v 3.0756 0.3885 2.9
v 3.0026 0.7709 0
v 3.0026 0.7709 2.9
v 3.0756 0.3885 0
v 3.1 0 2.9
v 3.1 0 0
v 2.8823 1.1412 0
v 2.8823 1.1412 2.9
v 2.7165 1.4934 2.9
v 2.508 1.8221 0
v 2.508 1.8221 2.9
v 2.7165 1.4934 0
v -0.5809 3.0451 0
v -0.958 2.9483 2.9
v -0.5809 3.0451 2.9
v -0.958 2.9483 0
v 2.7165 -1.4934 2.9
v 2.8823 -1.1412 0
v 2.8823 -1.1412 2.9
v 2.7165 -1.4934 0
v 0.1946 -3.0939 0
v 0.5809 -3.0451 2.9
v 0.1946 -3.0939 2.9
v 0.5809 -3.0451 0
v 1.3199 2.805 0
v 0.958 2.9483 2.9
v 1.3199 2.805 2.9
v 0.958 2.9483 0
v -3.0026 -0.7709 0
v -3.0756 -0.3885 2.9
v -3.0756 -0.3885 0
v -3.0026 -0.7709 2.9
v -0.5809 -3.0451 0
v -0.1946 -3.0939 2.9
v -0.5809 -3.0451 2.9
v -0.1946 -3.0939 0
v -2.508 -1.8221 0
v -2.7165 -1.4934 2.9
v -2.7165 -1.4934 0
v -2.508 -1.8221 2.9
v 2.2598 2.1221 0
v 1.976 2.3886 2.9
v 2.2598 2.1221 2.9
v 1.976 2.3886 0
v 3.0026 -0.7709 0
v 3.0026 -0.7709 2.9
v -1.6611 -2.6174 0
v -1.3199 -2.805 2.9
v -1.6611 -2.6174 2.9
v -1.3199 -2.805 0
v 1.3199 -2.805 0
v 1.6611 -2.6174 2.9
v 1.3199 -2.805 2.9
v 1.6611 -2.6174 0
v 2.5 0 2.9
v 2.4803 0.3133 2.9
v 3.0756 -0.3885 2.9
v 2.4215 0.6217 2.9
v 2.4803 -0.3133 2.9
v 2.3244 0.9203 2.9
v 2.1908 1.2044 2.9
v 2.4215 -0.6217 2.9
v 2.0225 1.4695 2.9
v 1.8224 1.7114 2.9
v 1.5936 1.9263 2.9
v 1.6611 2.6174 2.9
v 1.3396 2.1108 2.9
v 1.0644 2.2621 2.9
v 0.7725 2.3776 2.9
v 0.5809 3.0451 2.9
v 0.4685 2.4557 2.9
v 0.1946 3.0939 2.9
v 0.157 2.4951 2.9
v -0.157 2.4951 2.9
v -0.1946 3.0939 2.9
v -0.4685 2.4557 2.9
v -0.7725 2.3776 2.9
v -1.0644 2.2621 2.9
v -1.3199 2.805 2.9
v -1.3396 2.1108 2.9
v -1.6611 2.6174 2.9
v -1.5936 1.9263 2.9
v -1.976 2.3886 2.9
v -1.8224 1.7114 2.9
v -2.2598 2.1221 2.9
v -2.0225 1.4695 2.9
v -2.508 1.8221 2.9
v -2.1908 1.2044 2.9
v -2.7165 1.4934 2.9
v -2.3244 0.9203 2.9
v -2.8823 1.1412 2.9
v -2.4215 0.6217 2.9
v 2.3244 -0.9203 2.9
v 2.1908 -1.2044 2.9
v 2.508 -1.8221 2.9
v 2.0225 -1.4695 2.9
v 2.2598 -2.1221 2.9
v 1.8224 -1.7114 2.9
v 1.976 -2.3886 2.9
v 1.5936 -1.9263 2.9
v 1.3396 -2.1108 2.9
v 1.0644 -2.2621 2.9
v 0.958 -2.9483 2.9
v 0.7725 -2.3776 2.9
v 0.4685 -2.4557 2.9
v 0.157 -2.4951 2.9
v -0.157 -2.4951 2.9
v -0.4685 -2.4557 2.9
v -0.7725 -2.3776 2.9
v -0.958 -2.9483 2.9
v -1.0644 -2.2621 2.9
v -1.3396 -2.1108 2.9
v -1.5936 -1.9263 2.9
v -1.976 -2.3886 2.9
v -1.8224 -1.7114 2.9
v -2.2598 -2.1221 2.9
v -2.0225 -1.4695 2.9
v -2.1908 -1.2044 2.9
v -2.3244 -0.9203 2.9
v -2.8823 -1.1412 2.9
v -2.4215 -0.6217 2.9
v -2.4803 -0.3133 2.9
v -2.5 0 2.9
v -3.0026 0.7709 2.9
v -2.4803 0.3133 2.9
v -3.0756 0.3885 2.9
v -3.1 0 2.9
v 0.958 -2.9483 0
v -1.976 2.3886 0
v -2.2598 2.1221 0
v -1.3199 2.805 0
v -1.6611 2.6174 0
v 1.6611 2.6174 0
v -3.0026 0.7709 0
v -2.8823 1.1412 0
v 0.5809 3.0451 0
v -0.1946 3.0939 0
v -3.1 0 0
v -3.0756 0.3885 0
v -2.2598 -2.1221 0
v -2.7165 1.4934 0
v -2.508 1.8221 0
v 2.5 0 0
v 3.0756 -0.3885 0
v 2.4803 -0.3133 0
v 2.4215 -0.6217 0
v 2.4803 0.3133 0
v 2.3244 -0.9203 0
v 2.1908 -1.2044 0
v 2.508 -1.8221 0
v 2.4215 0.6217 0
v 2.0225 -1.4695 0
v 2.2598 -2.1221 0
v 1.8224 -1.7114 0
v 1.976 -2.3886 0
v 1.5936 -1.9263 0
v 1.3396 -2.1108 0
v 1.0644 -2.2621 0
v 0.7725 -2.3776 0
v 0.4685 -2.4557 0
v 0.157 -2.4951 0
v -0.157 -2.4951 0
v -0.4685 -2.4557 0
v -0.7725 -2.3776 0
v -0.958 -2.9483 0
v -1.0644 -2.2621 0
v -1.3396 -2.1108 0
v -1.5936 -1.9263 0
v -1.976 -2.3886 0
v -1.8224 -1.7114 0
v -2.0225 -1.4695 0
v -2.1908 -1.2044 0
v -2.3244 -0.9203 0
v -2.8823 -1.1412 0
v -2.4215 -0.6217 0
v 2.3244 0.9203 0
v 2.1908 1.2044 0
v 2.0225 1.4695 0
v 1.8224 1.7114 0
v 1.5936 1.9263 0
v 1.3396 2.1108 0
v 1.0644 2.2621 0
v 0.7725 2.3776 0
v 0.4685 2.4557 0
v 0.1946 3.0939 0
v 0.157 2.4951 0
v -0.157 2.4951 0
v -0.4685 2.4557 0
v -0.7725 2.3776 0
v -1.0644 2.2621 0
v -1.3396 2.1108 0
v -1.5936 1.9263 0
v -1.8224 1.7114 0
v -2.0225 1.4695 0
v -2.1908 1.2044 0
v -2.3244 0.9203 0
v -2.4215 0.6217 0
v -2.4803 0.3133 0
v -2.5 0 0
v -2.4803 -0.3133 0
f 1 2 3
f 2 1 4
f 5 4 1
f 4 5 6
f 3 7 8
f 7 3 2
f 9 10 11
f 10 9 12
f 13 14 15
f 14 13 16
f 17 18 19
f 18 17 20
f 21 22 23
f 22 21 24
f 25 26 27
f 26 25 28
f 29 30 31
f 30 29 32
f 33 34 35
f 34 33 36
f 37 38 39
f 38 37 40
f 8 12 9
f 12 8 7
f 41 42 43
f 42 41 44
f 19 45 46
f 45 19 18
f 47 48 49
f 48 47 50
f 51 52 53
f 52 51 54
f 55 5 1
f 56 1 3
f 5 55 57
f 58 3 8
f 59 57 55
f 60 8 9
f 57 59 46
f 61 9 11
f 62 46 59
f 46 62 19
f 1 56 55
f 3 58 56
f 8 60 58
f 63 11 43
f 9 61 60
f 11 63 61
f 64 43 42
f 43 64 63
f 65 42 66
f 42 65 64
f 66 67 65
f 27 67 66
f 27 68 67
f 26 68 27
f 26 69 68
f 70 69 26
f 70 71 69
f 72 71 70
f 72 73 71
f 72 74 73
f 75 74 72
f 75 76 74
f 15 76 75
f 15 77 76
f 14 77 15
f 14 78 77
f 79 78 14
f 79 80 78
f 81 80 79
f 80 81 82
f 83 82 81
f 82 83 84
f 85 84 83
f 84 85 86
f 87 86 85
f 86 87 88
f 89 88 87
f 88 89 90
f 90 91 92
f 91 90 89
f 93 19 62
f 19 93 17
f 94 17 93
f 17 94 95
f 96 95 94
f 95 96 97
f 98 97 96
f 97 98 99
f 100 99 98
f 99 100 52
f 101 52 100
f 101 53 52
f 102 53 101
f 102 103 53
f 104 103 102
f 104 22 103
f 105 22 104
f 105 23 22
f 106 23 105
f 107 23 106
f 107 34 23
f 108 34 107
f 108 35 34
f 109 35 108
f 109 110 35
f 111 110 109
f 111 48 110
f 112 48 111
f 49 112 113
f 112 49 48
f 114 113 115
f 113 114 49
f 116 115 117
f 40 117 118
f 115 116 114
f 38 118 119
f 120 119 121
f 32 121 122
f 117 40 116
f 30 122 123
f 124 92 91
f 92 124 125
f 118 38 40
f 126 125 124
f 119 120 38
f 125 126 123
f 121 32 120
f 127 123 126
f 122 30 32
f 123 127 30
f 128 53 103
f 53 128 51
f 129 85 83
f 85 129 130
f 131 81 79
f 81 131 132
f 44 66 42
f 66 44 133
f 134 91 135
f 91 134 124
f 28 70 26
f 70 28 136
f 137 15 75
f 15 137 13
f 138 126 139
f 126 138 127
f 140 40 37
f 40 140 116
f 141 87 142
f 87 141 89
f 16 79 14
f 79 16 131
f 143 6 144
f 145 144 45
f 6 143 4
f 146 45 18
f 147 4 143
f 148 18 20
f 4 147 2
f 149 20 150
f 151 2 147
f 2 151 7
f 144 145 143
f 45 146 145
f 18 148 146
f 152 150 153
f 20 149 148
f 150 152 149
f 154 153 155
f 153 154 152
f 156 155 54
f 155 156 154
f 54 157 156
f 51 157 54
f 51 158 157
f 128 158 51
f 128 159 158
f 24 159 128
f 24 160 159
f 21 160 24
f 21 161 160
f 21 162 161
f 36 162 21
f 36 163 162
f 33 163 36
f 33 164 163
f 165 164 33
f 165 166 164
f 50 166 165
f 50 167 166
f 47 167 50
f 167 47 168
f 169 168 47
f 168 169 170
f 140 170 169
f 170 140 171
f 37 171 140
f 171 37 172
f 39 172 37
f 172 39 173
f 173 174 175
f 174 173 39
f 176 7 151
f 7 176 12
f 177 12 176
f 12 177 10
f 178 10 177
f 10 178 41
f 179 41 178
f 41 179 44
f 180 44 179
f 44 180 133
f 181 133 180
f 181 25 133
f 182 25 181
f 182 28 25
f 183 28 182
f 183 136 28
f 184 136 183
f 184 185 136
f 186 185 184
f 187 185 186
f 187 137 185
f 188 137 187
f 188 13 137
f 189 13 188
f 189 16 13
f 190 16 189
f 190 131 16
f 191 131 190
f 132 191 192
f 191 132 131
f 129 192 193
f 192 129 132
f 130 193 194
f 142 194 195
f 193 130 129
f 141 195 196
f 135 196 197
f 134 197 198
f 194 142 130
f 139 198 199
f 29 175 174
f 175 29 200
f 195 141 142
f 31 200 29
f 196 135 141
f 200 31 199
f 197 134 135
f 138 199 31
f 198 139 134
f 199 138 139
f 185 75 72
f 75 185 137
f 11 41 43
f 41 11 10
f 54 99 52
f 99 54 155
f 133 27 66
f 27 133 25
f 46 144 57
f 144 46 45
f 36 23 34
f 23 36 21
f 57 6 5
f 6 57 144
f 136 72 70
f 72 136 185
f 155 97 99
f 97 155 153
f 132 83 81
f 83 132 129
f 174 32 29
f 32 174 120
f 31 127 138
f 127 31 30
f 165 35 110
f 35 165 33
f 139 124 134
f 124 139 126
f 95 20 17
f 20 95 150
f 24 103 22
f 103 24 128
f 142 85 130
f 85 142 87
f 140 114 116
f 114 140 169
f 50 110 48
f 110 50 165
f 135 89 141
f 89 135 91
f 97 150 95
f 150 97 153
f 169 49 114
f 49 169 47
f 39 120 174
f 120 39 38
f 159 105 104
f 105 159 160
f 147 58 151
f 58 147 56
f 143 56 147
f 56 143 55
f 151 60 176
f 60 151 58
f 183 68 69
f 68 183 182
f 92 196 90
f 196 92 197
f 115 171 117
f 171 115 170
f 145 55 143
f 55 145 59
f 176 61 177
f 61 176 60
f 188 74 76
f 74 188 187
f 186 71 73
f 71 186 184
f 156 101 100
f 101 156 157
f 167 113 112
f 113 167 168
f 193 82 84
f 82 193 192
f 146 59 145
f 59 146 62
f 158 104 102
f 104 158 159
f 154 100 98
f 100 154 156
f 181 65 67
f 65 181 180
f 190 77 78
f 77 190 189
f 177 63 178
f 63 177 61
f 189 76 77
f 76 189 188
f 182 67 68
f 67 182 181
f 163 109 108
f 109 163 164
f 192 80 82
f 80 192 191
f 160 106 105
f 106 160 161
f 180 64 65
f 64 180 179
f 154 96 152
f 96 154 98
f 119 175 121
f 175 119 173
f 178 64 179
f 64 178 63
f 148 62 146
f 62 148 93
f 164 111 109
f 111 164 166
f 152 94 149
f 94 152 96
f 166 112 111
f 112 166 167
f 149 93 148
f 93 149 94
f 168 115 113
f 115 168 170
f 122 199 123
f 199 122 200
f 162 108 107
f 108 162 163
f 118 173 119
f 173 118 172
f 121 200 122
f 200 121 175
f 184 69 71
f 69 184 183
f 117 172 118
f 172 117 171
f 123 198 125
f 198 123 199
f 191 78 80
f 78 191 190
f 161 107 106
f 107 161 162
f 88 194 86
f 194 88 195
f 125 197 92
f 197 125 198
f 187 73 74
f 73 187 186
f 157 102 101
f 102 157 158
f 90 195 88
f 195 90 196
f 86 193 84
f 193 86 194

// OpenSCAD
$fn=50; 
 difference() {
     cylinder(h=2.9, d=6.2);
     cylinder(h=2.9, d=5);
 }
